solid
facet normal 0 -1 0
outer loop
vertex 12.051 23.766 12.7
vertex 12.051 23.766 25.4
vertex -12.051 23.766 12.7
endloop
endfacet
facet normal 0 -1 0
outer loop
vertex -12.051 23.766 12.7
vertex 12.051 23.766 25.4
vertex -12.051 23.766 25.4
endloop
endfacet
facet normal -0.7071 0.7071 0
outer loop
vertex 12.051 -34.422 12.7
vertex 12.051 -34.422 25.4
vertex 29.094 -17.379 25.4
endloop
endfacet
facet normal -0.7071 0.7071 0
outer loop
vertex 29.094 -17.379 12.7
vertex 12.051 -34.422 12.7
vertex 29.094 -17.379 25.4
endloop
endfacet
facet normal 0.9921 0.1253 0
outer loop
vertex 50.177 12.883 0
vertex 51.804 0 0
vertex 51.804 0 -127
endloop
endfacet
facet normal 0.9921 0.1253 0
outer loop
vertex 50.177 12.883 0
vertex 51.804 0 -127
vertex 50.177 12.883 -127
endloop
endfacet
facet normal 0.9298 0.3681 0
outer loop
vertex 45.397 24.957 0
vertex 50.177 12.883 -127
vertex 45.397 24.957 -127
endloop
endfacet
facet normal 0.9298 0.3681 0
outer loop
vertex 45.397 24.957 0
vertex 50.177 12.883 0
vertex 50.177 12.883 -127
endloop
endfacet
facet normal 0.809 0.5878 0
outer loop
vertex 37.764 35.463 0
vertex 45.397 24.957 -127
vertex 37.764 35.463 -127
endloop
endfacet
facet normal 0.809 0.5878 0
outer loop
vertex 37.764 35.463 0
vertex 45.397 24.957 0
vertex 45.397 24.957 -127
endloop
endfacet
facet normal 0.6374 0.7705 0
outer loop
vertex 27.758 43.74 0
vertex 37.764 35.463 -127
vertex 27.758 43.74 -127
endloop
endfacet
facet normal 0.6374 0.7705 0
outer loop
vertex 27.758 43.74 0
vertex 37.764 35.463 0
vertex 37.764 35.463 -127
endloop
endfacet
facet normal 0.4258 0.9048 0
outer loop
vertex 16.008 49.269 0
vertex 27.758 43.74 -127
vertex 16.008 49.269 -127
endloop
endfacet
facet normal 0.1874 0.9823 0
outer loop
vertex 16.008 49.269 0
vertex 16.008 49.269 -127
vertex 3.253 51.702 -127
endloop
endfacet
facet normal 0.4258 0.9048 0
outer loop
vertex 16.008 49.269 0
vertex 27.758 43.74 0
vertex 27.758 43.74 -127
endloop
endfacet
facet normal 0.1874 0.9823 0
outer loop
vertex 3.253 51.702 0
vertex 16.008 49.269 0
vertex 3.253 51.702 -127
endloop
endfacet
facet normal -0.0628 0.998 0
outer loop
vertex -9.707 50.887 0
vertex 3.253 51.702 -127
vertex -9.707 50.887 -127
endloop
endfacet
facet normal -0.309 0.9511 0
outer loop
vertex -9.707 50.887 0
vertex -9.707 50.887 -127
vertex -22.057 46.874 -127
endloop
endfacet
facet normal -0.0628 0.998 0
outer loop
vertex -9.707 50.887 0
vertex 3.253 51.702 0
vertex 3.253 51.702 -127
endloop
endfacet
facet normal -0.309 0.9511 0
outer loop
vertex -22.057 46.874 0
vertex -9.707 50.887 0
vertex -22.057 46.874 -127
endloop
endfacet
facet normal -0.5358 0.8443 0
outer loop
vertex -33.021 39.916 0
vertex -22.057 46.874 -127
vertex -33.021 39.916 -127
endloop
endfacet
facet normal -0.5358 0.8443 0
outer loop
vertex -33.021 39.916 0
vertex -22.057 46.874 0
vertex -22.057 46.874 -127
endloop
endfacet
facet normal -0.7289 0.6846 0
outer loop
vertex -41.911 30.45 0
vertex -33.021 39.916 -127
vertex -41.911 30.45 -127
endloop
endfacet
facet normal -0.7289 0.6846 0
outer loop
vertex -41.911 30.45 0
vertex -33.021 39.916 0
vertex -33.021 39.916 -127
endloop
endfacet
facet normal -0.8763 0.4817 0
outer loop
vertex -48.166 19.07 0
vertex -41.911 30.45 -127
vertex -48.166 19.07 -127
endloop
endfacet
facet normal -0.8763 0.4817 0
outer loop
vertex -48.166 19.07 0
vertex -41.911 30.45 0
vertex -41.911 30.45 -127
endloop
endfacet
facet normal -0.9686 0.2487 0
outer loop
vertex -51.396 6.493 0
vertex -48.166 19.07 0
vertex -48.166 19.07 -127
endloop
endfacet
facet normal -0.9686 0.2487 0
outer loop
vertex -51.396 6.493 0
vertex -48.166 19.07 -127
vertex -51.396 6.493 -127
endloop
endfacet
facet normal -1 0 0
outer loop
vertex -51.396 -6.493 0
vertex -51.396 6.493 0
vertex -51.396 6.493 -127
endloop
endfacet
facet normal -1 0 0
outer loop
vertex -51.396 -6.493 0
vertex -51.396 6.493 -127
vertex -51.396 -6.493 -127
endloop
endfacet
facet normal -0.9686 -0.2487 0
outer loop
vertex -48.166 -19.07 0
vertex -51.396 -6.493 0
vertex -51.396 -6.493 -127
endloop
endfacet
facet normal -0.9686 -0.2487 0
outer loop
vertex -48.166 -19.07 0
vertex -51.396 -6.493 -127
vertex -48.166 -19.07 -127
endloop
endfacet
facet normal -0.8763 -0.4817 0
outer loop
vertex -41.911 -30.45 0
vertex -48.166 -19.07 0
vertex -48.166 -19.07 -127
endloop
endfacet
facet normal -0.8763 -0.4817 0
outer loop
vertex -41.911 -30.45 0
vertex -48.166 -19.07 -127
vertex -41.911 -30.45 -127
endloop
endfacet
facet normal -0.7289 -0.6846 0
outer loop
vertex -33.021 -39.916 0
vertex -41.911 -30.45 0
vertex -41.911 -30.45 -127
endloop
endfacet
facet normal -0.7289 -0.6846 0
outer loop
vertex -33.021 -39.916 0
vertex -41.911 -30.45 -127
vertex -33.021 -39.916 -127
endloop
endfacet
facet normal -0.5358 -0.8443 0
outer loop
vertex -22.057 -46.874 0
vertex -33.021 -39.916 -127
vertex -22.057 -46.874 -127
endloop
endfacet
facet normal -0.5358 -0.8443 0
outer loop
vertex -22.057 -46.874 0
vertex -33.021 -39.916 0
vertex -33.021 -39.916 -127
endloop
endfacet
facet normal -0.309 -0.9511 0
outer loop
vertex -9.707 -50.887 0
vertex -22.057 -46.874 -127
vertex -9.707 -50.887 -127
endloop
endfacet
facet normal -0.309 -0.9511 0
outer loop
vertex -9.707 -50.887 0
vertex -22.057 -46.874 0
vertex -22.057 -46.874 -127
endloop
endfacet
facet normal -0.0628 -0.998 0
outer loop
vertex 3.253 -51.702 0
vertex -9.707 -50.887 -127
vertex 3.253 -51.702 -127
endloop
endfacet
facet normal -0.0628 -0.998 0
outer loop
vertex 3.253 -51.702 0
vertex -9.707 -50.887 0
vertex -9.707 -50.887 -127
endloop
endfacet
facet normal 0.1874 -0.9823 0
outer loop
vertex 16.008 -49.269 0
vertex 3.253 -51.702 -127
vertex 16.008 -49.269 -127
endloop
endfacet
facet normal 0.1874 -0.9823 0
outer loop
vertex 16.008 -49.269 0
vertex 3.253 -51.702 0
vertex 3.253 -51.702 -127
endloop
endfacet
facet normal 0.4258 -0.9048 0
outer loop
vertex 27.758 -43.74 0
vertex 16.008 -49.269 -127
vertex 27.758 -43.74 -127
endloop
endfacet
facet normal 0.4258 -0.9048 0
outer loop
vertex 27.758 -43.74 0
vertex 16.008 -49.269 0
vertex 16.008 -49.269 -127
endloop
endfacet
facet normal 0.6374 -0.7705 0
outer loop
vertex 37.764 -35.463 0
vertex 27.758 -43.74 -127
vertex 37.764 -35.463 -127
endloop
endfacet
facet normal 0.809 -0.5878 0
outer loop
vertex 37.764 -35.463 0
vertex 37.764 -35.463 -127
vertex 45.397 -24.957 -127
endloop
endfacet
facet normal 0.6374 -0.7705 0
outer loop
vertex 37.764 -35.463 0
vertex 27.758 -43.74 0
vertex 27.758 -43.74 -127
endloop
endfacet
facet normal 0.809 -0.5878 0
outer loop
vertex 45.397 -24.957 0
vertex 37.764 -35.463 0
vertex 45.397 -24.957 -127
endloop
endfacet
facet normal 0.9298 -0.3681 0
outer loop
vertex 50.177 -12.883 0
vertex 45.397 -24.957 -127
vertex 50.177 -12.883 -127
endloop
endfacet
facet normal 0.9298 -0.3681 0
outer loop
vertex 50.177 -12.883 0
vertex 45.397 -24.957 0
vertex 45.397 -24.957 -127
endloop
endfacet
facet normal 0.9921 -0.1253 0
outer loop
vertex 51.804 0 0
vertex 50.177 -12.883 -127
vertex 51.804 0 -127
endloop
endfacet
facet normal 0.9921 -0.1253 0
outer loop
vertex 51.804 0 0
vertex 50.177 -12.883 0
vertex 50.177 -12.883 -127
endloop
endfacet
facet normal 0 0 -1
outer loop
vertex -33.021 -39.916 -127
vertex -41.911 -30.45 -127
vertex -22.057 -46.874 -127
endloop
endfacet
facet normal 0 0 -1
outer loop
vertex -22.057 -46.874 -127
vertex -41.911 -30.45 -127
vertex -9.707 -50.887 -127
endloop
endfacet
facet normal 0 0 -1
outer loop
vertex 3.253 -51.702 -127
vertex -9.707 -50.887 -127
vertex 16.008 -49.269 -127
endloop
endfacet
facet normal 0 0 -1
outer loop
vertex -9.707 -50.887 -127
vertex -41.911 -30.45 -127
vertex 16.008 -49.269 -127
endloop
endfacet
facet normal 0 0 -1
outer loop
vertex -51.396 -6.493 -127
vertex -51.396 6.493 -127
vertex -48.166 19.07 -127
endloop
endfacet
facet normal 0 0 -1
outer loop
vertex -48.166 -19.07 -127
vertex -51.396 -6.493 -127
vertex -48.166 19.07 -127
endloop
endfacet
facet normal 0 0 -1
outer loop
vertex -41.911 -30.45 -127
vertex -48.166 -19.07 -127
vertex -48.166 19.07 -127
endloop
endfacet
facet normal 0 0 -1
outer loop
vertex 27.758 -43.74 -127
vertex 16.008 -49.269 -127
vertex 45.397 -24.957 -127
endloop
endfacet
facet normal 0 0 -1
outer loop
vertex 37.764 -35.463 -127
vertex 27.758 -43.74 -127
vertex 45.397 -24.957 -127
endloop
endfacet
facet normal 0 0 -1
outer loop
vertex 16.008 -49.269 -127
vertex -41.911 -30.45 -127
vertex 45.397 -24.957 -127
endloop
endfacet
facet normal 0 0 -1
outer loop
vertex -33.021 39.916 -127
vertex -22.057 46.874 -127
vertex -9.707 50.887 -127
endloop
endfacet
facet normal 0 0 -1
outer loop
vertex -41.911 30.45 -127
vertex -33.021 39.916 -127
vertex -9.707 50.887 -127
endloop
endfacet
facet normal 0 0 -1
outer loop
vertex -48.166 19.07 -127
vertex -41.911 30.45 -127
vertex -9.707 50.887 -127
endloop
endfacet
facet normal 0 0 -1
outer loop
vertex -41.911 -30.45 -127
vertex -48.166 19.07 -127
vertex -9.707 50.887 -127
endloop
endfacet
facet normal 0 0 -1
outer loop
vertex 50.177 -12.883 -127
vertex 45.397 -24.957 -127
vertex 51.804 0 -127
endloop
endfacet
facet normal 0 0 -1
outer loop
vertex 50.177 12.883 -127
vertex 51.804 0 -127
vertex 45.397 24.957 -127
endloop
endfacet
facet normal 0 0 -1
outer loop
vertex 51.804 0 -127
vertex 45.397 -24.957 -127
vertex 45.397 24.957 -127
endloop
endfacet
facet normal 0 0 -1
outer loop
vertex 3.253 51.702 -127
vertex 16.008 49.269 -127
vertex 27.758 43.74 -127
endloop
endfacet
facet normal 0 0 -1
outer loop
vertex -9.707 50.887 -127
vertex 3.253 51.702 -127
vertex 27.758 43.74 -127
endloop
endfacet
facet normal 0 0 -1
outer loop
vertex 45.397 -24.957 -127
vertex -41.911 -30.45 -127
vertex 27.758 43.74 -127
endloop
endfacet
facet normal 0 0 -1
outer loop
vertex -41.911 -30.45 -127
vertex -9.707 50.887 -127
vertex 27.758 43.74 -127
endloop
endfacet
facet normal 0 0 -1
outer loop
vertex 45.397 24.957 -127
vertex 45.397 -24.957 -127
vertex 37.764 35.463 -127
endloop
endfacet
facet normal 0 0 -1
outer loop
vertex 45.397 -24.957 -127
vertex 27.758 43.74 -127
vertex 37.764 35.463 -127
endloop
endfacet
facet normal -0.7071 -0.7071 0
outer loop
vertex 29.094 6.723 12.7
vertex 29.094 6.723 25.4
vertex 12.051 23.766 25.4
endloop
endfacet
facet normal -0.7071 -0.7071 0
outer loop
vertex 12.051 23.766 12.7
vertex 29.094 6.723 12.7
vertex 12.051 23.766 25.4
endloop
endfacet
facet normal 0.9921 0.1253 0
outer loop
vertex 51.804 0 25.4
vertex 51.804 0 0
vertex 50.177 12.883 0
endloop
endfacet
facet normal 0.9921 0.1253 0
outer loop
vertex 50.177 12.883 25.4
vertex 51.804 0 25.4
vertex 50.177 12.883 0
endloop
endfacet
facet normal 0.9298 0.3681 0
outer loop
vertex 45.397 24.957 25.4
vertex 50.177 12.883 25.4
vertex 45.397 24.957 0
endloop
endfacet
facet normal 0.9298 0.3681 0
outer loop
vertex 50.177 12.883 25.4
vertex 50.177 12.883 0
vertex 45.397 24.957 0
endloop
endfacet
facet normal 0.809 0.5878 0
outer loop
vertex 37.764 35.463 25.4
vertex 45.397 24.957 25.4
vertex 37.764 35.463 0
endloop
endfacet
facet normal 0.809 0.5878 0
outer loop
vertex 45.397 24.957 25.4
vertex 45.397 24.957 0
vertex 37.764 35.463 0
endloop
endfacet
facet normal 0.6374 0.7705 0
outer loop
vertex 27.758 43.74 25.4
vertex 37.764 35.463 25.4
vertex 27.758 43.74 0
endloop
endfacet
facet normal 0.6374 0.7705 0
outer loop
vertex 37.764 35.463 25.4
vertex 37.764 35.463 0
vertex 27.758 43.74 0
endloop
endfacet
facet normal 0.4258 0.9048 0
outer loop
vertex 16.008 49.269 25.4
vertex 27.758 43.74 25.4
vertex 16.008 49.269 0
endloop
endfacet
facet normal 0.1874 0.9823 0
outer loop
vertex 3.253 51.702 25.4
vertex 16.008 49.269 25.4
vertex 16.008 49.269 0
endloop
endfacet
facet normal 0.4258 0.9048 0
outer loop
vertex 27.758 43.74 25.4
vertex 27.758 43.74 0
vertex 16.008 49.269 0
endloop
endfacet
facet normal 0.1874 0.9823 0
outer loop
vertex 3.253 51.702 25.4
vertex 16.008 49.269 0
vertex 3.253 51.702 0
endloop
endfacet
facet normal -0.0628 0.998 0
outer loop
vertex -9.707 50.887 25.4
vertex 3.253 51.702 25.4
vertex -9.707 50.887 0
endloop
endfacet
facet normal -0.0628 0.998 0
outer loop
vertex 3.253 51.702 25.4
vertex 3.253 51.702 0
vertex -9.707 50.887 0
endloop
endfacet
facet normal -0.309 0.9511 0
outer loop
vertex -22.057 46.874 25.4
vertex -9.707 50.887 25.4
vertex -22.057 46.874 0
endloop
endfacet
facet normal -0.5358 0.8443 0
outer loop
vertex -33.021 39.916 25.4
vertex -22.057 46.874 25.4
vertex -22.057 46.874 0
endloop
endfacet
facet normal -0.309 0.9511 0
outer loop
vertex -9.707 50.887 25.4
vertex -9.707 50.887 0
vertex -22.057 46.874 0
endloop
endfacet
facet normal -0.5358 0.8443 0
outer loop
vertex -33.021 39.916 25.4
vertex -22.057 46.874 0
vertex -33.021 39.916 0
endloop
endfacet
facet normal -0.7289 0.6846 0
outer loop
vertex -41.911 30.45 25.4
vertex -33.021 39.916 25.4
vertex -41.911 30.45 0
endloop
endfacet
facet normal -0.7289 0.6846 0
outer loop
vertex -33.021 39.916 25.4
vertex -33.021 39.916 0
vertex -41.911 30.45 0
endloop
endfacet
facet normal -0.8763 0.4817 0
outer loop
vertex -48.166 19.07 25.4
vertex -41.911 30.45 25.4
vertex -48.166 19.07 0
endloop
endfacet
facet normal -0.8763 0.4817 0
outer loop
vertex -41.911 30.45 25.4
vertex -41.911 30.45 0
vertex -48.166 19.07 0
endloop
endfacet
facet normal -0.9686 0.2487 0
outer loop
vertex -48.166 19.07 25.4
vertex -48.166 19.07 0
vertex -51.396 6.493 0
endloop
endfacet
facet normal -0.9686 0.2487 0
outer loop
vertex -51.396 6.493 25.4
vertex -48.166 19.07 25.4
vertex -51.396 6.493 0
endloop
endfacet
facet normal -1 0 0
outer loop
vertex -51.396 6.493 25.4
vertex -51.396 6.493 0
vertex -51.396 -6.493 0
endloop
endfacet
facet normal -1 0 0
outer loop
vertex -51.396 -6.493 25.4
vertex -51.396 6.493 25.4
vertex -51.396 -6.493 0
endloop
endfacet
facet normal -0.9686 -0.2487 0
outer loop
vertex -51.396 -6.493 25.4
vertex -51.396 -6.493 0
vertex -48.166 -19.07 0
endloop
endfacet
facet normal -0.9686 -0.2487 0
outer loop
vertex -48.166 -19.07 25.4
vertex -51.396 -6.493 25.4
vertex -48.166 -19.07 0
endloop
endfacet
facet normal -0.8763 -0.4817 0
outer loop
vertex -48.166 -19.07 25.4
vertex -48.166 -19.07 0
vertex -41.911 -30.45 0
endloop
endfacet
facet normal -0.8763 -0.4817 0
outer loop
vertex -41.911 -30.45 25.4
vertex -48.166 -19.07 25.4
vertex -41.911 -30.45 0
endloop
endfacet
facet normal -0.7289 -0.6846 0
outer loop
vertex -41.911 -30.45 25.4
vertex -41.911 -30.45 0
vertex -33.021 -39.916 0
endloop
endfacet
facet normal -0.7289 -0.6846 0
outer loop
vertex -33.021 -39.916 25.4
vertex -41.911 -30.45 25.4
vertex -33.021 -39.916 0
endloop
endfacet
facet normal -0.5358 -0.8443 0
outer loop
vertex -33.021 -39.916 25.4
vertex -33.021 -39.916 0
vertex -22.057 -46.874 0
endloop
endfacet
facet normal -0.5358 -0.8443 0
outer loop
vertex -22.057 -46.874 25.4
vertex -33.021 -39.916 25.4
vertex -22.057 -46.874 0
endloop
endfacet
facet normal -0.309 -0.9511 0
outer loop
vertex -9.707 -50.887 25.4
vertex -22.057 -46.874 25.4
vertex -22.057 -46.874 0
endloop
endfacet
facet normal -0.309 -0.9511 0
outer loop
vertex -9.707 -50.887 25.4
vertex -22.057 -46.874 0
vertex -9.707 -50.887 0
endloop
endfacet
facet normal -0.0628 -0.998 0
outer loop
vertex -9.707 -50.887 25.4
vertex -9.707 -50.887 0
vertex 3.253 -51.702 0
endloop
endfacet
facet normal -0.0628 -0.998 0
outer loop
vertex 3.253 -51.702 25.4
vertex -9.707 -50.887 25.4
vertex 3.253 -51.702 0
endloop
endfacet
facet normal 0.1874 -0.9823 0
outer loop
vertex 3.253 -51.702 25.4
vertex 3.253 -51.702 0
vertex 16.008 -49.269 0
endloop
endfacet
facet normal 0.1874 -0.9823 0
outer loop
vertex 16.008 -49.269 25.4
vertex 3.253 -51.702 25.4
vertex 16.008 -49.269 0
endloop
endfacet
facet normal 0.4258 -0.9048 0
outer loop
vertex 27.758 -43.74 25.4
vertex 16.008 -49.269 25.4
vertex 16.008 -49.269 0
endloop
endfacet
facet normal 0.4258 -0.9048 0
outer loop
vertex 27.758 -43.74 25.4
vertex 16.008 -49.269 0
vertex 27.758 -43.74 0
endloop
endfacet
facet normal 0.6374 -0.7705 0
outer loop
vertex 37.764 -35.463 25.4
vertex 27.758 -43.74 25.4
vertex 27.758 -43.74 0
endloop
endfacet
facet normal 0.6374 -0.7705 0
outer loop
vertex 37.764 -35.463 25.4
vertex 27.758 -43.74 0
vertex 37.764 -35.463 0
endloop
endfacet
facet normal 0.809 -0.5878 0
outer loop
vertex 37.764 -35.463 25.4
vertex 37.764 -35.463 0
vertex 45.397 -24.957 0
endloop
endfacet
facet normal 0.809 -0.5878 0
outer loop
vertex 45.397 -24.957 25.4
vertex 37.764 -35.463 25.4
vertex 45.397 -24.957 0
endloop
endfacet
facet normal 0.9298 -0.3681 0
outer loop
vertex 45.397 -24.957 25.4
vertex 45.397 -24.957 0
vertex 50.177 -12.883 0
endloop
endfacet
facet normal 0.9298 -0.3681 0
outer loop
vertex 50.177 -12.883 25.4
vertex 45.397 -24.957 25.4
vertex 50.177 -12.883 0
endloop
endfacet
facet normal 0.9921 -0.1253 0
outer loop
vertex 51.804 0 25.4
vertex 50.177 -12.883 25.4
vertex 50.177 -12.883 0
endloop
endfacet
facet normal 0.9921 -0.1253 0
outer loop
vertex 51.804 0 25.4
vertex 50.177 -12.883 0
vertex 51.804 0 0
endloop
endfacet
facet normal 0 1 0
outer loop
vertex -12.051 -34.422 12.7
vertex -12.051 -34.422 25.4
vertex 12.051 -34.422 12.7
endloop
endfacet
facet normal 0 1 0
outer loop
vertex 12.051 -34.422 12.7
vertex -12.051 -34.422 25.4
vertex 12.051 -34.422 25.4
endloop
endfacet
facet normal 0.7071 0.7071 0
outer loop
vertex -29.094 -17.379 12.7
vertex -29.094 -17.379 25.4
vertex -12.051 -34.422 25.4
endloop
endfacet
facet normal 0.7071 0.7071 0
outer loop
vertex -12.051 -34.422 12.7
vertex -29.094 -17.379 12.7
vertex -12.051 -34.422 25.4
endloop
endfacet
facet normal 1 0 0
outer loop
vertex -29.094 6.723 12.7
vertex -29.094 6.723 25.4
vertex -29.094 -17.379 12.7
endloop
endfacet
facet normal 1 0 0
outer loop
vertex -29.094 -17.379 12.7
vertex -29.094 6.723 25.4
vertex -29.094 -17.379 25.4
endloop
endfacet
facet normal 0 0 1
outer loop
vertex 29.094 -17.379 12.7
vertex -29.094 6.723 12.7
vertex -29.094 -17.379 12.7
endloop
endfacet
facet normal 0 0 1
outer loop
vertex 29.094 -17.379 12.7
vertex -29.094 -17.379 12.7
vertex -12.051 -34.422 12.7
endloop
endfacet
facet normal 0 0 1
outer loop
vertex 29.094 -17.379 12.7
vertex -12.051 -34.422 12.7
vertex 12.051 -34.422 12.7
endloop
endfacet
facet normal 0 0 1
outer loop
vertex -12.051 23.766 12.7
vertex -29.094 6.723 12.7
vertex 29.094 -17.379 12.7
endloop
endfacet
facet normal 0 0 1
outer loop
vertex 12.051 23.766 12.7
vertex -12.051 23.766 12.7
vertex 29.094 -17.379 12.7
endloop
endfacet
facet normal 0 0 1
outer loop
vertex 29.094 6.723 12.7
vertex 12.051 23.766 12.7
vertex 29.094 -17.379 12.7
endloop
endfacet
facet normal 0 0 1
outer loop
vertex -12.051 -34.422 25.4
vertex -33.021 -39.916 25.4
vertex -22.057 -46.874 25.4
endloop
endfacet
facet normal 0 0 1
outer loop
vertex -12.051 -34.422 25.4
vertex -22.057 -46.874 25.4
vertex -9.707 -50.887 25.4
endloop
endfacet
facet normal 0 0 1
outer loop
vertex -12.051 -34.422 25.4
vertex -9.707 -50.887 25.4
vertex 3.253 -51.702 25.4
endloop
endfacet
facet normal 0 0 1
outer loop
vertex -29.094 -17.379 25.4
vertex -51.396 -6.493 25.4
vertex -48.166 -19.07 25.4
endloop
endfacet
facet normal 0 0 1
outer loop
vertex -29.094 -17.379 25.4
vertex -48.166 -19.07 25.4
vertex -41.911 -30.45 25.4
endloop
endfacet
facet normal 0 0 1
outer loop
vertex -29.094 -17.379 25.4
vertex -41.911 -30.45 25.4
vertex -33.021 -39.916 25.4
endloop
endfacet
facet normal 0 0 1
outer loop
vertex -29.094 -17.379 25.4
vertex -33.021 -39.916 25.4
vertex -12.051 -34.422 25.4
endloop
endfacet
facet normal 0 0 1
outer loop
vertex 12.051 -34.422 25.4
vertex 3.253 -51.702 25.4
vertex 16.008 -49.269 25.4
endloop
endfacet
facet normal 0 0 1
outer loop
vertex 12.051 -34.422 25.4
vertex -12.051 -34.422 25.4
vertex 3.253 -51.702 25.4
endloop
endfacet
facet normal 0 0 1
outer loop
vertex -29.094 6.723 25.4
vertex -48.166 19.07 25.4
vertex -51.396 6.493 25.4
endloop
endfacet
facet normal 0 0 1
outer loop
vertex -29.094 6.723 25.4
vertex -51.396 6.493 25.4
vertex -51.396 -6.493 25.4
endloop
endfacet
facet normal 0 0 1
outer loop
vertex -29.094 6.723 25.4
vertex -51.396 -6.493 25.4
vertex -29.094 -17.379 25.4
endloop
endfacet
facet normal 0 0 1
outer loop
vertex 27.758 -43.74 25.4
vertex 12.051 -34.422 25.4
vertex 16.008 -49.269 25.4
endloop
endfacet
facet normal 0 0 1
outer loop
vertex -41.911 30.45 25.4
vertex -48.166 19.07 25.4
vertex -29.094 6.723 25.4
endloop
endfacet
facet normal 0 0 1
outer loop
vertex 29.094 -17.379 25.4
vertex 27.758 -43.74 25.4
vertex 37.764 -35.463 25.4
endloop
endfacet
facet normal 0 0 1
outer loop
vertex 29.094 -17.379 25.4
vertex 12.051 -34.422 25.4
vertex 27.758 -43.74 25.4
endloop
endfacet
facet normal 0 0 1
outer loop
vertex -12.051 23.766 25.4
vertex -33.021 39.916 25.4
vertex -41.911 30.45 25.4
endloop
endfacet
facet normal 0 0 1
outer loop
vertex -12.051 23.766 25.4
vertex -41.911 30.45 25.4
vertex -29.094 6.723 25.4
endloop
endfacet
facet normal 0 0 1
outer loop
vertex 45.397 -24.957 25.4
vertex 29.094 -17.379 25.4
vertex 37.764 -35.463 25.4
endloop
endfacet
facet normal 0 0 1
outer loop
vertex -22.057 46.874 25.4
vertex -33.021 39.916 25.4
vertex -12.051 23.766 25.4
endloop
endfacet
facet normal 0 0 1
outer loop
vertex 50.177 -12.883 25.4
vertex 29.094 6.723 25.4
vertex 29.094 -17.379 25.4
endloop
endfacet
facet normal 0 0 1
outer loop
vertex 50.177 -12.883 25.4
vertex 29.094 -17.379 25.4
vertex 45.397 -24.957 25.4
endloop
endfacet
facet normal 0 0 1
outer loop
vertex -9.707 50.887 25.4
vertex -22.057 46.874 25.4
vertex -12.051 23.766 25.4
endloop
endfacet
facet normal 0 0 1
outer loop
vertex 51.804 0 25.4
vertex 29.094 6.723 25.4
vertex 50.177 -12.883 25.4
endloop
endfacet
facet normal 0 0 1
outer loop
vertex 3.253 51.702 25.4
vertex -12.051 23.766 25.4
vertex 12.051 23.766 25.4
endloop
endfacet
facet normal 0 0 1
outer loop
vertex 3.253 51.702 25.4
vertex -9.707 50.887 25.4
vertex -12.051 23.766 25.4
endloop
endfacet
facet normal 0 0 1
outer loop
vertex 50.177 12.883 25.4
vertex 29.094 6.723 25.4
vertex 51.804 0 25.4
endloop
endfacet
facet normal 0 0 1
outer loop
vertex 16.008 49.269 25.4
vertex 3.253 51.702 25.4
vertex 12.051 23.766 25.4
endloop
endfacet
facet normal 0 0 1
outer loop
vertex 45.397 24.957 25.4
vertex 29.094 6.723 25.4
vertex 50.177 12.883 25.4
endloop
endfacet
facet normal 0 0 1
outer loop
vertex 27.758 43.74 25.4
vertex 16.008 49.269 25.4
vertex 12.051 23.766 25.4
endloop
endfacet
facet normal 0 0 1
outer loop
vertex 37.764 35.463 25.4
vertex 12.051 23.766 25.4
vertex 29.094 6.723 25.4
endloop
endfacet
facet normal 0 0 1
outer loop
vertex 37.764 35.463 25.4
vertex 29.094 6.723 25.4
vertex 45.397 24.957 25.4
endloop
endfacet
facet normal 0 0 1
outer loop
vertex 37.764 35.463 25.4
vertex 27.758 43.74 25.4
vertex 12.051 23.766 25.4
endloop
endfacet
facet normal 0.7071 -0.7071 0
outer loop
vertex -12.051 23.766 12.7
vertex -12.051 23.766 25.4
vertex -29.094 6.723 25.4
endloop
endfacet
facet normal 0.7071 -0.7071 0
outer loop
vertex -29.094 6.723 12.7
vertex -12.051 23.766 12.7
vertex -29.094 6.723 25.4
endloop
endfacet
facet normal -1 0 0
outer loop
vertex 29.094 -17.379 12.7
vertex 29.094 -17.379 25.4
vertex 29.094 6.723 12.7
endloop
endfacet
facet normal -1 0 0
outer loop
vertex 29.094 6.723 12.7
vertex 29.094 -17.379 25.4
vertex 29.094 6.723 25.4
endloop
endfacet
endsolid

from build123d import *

# Parameters (mm, degrees)
F0_R     = 51.8043549738
F1_DEPTH = 76.2
F2_DEPTH = 25.4
F3_DEPTH = 25.4
F5_DEPTH = 12.7
F6_DEPTH = 127


with BuildPart() as f1:
    # F0 (on Top) → F1 (new body)
    with BuildSketch(Plane.XY):
        Circle(F0_R)
    extrude(amount=F1_DEPTH)

    # F2 (cut): a face of the model
    f2_faces = [f1.faces().sort_by_distance(p)[0] for p in [
        (0, 0, 76.2),
    ]]
    extrude(f2_faces, amount=-F2_DEPTH, mode=Mode.SUBTRACT)

    # F3 (cut): a face of the model
    f3_faces = [f1.faces().sort_by_distance(p)[0] for p in [
        (0, 0, 50.8),
    ]]
    extrude(f3_faces, amount=-F3_DEPTH, mode=Mode.SUBTRACT)

    # F4 (on face) → F5 (cut)
    with BuildSketch(Plane.XY.offset(25.4)):
        Polygon((29.0936566889, -17.3791157596), (29.0936566889, 6.7228585996), (12.0509871796, 23.7655281089), (-12.0509871796, 23.7655281089), (-29.0936566889, 6.7228585996), (-29.0936566889, -17.3791157596), (-12.0509871796, -34.4217852689), (12.0509871796, -34.4217852689), align=None)
    extrude(amount=-F5_DEPTH, mode=Mode.SUBTRACT)

    # F6 (add): a face of the model
    f6_faces = [f1.faces().sort_by_distance(p)[0] for p in [
        (0, 0, 0),
    ]]
    extrude(f6_faces, amount=F6_DEPTH)


solid = f1.part
